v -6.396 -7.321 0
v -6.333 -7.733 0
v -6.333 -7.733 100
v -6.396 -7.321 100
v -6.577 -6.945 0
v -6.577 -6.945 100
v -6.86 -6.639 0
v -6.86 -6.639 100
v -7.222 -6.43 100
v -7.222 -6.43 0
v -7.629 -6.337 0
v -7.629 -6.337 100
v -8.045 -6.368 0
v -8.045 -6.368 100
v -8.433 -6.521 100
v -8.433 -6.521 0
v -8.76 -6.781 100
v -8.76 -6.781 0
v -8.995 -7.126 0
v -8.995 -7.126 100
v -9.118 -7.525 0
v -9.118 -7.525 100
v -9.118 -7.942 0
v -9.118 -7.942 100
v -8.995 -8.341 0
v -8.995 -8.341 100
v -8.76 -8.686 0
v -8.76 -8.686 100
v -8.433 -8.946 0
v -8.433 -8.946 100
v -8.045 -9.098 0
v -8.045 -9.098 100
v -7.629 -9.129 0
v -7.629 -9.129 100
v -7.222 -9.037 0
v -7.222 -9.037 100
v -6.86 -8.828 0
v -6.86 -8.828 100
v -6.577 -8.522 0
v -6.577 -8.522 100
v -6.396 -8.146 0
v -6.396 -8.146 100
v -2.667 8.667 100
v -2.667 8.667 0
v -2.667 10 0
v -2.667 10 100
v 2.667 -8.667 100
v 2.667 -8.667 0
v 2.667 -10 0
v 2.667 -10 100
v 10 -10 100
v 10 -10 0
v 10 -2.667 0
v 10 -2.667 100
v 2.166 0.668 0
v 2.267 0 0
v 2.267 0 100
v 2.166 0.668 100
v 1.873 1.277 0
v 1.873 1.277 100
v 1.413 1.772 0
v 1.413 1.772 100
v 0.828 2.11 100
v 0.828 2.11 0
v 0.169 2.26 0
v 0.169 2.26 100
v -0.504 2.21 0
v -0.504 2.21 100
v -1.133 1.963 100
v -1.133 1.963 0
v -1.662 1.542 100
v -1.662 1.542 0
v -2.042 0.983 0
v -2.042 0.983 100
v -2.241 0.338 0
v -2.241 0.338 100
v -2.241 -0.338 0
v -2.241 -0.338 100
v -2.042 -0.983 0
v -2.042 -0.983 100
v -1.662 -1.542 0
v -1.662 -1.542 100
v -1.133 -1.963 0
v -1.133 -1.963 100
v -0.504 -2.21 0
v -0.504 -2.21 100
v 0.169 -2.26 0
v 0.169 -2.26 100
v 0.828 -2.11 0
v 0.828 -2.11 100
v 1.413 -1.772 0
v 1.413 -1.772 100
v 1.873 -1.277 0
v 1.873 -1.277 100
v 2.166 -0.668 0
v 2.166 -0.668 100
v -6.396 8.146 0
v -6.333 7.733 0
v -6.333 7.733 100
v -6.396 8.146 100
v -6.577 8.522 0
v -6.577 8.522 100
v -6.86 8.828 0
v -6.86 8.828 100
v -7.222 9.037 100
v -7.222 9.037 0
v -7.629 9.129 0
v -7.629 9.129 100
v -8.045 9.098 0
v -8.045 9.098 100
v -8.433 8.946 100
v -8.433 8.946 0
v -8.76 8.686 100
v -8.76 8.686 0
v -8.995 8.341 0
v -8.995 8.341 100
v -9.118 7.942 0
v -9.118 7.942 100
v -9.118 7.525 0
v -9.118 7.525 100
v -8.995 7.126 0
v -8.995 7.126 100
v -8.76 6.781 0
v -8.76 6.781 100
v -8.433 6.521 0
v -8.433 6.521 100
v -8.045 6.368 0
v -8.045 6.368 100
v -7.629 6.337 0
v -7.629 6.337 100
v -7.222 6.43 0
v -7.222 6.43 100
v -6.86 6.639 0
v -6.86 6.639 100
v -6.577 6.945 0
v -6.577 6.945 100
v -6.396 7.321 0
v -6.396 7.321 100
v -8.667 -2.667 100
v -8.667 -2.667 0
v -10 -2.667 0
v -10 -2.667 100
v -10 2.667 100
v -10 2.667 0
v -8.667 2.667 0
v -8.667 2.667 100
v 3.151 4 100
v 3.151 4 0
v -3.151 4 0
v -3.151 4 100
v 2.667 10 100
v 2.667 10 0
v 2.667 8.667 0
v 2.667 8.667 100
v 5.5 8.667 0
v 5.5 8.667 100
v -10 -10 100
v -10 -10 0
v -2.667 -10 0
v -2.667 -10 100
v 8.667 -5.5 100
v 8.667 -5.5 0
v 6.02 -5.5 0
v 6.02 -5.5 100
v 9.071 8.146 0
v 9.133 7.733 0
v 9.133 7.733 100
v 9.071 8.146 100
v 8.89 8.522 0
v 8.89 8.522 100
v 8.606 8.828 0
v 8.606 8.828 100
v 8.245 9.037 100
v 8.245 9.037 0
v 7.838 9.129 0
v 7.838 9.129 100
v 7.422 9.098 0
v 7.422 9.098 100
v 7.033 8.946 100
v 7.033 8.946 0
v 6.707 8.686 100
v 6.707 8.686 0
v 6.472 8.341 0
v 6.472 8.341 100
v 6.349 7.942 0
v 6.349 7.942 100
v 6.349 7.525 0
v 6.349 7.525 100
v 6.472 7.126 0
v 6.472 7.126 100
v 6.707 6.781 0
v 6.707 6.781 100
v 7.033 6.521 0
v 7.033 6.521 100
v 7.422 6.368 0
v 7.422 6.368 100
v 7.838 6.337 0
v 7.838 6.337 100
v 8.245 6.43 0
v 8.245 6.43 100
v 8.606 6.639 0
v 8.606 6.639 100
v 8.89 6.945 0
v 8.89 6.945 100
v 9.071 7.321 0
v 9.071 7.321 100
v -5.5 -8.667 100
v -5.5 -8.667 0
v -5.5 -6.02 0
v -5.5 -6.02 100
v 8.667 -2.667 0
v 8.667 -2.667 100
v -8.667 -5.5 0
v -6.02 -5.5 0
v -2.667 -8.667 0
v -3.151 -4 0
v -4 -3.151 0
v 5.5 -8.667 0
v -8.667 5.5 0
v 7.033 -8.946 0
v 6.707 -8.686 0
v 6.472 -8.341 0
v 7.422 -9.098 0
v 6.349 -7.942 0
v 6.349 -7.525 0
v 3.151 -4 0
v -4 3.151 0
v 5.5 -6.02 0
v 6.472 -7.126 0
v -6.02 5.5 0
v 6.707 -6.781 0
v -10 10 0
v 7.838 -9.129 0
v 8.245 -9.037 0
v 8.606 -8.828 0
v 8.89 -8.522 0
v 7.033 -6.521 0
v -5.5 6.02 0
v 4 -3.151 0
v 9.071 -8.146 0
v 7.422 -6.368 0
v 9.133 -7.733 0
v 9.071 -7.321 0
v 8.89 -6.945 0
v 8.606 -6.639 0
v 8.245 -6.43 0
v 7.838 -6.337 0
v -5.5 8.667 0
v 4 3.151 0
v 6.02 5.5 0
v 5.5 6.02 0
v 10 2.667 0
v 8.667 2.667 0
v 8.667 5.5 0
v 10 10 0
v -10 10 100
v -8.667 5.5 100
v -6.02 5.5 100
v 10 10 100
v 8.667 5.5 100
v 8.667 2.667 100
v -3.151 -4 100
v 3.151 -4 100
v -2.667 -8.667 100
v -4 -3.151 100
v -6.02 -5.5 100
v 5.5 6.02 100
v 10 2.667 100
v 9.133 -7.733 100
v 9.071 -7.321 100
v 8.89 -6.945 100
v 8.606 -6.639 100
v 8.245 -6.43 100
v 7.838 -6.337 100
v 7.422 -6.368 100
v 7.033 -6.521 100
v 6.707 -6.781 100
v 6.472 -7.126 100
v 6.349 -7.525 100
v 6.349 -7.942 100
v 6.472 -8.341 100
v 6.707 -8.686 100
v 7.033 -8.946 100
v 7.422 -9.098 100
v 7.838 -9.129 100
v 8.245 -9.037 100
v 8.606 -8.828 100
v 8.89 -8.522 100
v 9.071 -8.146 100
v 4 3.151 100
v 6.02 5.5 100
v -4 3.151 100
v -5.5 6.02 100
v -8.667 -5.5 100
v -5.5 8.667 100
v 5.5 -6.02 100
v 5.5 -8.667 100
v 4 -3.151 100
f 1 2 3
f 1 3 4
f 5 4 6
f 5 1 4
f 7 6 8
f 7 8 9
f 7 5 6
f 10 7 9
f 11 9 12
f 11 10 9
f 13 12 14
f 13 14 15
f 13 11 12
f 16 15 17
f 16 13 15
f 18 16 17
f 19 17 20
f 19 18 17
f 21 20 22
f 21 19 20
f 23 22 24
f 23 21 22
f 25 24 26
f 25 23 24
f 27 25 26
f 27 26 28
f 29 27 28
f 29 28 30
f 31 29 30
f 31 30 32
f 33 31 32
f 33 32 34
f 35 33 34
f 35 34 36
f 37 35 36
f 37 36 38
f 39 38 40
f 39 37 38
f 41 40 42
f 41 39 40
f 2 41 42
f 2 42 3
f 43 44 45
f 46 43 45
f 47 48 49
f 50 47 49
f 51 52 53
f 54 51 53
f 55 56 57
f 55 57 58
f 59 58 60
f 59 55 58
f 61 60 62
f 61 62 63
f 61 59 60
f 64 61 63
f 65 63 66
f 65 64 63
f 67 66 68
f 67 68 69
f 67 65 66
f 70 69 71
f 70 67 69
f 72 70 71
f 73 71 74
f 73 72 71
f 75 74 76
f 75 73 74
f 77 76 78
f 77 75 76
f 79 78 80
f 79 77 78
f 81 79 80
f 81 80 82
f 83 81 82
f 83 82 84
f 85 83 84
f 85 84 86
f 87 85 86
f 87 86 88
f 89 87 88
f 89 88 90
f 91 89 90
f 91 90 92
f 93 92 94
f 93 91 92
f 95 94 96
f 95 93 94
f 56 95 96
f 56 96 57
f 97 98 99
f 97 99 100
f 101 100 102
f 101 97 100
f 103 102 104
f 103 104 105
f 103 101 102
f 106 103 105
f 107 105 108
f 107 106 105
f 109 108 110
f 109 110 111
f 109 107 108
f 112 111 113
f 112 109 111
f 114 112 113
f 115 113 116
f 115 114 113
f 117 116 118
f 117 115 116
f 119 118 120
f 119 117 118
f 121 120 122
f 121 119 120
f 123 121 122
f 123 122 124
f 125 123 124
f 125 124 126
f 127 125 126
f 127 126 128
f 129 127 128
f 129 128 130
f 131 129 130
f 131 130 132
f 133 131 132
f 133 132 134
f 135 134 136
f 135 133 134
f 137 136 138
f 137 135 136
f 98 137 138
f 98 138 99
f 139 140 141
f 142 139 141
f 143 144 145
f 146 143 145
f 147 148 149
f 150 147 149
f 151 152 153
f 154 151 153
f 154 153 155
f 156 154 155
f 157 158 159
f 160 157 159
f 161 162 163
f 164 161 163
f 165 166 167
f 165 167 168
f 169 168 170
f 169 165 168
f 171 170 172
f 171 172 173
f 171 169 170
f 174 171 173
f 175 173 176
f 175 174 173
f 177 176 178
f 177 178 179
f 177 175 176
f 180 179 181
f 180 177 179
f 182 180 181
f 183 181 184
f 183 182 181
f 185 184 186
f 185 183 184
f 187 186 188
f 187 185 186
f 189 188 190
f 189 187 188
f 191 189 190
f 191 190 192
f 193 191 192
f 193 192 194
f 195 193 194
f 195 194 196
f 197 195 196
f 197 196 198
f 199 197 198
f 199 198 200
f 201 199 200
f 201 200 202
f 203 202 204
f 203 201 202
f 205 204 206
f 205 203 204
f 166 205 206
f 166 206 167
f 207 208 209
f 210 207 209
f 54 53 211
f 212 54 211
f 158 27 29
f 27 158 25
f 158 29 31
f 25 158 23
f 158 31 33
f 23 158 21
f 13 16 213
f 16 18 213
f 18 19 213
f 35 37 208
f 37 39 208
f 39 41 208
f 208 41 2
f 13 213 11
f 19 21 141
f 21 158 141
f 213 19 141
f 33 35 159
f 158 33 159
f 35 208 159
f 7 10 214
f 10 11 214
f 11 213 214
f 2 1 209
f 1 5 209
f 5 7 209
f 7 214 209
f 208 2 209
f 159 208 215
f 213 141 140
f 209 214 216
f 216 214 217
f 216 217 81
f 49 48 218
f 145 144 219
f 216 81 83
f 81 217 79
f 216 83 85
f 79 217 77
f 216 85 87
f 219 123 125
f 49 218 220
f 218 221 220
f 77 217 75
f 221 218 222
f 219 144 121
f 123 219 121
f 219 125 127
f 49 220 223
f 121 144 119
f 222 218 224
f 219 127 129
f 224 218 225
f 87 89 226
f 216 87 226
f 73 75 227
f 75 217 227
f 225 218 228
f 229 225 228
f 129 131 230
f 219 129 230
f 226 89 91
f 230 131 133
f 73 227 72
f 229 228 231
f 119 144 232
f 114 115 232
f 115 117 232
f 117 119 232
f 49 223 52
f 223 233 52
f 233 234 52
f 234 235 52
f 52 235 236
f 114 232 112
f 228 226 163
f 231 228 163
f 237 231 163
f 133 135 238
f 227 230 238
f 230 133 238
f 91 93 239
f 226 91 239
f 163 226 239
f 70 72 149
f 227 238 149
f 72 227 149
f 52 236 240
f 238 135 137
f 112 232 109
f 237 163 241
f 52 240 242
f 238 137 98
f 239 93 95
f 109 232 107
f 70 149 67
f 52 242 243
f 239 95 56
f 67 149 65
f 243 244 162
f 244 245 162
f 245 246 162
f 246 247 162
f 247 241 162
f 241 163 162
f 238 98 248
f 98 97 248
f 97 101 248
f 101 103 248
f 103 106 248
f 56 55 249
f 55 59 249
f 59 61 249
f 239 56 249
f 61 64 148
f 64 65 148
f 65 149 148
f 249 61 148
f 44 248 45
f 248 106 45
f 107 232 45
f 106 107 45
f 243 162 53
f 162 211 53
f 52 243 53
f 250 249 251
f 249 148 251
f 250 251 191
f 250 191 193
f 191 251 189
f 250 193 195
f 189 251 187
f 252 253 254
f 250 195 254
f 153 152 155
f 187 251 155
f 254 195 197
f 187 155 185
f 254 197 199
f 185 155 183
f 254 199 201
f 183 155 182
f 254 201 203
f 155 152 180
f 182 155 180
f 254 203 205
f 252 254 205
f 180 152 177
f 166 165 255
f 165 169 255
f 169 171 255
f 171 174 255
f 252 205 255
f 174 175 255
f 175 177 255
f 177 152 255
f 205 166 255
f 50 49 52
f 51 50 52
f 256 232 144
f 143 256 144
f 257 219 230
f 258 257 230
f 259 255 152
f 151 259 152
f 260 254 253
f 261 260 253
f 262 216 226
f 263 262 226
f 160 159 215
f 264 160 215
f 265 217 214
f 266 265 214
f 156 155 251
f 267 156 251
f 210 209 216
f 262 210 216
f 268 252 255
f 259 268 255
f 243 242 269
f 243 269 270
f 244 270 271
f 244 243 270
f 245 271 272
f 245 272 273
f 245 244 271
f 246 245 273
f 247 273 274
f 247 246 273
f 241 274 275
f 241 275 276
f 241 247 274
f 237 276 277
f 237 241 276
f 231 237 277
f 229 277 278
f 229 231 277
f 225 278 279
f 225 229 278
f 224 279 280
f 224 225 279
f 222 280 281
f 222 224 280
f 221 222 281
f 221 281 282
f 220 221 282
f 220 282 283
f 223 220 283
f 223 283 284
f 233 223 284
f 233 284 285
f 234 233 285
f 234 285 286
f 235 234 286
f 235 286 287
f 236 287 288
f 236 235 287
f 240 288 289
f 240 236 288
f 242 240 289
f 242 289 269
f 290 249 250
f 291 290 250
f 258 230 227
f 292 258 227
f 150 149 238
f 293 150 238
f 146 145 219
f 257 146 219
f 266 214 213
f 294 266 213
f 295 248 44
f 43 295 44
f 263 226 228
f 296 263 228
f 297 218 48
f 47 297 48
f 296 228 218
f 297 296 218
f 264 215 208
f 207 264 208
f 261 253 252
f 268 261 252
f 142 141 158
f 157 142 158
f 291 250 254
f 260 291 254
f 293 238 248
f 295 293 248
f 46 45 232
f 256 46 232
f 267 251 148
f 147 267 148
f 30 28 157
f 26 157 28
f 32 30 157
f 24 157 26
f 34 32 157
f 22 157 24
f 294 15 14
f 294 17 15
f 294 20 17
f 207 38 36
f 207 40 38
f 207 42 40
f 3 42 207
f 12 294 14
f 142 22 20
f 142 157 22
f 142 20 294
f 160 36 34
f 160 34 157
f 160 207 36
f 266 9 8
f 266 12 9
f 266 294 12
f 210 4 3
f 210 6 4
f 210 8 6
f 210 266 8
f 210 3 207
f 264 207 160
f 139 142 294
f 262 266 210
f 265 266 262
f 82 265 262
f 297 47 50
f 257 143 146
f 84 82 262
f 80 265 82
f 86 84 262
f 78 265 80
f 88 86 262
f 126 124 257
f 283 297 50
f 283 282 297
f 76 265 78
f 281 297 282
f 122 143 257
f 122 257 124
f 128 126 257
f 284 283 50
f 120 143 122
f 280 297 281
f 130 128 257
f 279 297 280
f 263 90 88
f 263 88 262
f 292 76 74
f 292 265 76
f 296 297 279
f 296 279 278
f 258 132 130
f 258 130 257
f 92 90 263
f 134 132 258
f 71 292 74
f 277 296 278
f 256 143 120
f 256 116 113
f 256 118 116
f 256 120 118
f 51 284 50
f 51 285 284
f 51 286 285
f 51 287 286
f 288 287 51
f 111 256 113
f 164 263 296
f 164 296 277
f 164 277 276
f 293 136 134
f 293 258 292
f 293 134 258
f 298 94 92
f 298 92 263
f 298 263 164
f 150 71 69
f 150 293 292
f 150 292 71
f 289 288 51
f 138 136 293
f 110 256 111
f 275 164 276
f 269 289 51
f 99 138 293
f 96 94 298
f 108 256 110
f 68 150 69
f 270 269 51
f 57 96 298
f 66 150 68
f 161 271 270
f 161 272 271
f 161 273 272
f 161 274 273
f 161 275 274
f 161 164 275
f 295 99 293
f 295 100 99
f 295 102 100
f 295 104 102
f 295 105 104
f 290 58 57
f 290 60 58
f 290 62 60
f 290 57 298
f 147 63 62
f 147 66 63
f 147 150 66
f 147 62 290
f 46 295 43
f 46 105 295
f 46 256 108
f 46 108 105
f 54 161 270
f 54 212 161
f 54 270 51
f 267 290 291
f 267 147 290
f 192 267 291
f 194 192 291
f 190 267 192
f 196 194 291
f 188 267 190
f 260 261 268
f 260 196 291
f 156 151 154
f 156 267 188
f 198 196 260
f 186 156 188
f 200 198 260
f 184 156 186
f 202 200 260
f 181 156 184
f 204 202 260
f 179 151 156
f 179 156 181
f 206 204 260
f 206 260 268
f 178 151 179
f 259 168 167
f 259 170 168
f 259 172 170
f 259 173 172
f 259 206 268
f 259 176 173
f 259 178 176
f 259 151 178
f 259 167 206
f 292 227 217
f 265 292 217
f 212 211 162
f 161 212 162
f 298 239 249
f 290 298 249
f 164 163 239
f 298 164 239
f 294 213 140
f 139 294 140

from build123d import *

# Parameters (mm, degrees)
SKETCH3_R           = 1.400007
SKETCH3_R_2         = 2.266678
BOSS_EXTRUDE1_DEPTH = 100


with BuildPart() as part:
    # Sketch3 → Boss-Extrude1 (new body)
    with BuildSketch(Plane.XY):
        Polygon((8.66671, -5.5000275), (6.019640257, -5.5000275), (4.00002, -3.150816419), (4.00002, 0), (4.00002, 3.150816419), (6.019640257, 5.5000275), (8.66671, 5.5000275), (8.66671, 2.66668), (10.00005, 2.66668), (10.00005, 10.00005), (2.66668, 10.00005), (2.66668, 8.66671), (5.5000275, 8.66671), (5.5000275, 6.019640257), (3.150816419, 4.00002), (0, 4.00002), (-3.150816419, 4.00002), (-5.5000275, 6.019640257), (-5.5000275, 8.66671), (-2.66668, 8.66671), (-2.66668, 10.00005), (-10.00005, 10.00005), (-10.00005, 2.66668), (-8.66671, 2.66668), (-8.66671, 5.5000275), (-6.019640257, 5.5000275), (-4.00002, 3.150816419), (-4.00002, 0), (-4.00002, -3.150816419), (-6.019640257, -5.5000275), (-8.66671, -5.5000275), (-8.66671, -2.66668), (-10.00005, -2.66668), (-10.00005, -10.00005), (-2.66668, -10.00005), (-2.66668, -8.66671), (-5.5000275, -8.66671), (-5.5000275, -6.019640257), (-3.150816419, -4.00002), (0, -4.00002), (3.150816419, -4.00002), (5.5000275, -6.019640257), (5.5000275, -8.66671), (2.66668, -8.66671), (2.66668, -10.00005), (10.00005, -10.00005), (10.00005, -2.66668), (8.66671, -2.66668), align=None)
        with Locations((7.733372, -7.733372)):
            Circle(SKETCH3_R, mode=Mode.SUBTRACT)
        with Locations((7.733372, 7.733372)):
            Circle(SKETCH3_R, mode=Mode.SUBTRACT)
        with Locations((-7.733372, 7.733372)):
            Circle(SKETCH3_R, mode=Mode.SUBTRACT)
        Circle(SKETCH3_R_2, mode=Mode.SUBTRACT)
        with Locations((-7.733372, -7.733372)):
            Circle(SKETCH3_R, mode=Mode.SUBTRACT)
    extrude(amount=BOSS_EXTRUDE1_DEPTH)


solid = part.part
